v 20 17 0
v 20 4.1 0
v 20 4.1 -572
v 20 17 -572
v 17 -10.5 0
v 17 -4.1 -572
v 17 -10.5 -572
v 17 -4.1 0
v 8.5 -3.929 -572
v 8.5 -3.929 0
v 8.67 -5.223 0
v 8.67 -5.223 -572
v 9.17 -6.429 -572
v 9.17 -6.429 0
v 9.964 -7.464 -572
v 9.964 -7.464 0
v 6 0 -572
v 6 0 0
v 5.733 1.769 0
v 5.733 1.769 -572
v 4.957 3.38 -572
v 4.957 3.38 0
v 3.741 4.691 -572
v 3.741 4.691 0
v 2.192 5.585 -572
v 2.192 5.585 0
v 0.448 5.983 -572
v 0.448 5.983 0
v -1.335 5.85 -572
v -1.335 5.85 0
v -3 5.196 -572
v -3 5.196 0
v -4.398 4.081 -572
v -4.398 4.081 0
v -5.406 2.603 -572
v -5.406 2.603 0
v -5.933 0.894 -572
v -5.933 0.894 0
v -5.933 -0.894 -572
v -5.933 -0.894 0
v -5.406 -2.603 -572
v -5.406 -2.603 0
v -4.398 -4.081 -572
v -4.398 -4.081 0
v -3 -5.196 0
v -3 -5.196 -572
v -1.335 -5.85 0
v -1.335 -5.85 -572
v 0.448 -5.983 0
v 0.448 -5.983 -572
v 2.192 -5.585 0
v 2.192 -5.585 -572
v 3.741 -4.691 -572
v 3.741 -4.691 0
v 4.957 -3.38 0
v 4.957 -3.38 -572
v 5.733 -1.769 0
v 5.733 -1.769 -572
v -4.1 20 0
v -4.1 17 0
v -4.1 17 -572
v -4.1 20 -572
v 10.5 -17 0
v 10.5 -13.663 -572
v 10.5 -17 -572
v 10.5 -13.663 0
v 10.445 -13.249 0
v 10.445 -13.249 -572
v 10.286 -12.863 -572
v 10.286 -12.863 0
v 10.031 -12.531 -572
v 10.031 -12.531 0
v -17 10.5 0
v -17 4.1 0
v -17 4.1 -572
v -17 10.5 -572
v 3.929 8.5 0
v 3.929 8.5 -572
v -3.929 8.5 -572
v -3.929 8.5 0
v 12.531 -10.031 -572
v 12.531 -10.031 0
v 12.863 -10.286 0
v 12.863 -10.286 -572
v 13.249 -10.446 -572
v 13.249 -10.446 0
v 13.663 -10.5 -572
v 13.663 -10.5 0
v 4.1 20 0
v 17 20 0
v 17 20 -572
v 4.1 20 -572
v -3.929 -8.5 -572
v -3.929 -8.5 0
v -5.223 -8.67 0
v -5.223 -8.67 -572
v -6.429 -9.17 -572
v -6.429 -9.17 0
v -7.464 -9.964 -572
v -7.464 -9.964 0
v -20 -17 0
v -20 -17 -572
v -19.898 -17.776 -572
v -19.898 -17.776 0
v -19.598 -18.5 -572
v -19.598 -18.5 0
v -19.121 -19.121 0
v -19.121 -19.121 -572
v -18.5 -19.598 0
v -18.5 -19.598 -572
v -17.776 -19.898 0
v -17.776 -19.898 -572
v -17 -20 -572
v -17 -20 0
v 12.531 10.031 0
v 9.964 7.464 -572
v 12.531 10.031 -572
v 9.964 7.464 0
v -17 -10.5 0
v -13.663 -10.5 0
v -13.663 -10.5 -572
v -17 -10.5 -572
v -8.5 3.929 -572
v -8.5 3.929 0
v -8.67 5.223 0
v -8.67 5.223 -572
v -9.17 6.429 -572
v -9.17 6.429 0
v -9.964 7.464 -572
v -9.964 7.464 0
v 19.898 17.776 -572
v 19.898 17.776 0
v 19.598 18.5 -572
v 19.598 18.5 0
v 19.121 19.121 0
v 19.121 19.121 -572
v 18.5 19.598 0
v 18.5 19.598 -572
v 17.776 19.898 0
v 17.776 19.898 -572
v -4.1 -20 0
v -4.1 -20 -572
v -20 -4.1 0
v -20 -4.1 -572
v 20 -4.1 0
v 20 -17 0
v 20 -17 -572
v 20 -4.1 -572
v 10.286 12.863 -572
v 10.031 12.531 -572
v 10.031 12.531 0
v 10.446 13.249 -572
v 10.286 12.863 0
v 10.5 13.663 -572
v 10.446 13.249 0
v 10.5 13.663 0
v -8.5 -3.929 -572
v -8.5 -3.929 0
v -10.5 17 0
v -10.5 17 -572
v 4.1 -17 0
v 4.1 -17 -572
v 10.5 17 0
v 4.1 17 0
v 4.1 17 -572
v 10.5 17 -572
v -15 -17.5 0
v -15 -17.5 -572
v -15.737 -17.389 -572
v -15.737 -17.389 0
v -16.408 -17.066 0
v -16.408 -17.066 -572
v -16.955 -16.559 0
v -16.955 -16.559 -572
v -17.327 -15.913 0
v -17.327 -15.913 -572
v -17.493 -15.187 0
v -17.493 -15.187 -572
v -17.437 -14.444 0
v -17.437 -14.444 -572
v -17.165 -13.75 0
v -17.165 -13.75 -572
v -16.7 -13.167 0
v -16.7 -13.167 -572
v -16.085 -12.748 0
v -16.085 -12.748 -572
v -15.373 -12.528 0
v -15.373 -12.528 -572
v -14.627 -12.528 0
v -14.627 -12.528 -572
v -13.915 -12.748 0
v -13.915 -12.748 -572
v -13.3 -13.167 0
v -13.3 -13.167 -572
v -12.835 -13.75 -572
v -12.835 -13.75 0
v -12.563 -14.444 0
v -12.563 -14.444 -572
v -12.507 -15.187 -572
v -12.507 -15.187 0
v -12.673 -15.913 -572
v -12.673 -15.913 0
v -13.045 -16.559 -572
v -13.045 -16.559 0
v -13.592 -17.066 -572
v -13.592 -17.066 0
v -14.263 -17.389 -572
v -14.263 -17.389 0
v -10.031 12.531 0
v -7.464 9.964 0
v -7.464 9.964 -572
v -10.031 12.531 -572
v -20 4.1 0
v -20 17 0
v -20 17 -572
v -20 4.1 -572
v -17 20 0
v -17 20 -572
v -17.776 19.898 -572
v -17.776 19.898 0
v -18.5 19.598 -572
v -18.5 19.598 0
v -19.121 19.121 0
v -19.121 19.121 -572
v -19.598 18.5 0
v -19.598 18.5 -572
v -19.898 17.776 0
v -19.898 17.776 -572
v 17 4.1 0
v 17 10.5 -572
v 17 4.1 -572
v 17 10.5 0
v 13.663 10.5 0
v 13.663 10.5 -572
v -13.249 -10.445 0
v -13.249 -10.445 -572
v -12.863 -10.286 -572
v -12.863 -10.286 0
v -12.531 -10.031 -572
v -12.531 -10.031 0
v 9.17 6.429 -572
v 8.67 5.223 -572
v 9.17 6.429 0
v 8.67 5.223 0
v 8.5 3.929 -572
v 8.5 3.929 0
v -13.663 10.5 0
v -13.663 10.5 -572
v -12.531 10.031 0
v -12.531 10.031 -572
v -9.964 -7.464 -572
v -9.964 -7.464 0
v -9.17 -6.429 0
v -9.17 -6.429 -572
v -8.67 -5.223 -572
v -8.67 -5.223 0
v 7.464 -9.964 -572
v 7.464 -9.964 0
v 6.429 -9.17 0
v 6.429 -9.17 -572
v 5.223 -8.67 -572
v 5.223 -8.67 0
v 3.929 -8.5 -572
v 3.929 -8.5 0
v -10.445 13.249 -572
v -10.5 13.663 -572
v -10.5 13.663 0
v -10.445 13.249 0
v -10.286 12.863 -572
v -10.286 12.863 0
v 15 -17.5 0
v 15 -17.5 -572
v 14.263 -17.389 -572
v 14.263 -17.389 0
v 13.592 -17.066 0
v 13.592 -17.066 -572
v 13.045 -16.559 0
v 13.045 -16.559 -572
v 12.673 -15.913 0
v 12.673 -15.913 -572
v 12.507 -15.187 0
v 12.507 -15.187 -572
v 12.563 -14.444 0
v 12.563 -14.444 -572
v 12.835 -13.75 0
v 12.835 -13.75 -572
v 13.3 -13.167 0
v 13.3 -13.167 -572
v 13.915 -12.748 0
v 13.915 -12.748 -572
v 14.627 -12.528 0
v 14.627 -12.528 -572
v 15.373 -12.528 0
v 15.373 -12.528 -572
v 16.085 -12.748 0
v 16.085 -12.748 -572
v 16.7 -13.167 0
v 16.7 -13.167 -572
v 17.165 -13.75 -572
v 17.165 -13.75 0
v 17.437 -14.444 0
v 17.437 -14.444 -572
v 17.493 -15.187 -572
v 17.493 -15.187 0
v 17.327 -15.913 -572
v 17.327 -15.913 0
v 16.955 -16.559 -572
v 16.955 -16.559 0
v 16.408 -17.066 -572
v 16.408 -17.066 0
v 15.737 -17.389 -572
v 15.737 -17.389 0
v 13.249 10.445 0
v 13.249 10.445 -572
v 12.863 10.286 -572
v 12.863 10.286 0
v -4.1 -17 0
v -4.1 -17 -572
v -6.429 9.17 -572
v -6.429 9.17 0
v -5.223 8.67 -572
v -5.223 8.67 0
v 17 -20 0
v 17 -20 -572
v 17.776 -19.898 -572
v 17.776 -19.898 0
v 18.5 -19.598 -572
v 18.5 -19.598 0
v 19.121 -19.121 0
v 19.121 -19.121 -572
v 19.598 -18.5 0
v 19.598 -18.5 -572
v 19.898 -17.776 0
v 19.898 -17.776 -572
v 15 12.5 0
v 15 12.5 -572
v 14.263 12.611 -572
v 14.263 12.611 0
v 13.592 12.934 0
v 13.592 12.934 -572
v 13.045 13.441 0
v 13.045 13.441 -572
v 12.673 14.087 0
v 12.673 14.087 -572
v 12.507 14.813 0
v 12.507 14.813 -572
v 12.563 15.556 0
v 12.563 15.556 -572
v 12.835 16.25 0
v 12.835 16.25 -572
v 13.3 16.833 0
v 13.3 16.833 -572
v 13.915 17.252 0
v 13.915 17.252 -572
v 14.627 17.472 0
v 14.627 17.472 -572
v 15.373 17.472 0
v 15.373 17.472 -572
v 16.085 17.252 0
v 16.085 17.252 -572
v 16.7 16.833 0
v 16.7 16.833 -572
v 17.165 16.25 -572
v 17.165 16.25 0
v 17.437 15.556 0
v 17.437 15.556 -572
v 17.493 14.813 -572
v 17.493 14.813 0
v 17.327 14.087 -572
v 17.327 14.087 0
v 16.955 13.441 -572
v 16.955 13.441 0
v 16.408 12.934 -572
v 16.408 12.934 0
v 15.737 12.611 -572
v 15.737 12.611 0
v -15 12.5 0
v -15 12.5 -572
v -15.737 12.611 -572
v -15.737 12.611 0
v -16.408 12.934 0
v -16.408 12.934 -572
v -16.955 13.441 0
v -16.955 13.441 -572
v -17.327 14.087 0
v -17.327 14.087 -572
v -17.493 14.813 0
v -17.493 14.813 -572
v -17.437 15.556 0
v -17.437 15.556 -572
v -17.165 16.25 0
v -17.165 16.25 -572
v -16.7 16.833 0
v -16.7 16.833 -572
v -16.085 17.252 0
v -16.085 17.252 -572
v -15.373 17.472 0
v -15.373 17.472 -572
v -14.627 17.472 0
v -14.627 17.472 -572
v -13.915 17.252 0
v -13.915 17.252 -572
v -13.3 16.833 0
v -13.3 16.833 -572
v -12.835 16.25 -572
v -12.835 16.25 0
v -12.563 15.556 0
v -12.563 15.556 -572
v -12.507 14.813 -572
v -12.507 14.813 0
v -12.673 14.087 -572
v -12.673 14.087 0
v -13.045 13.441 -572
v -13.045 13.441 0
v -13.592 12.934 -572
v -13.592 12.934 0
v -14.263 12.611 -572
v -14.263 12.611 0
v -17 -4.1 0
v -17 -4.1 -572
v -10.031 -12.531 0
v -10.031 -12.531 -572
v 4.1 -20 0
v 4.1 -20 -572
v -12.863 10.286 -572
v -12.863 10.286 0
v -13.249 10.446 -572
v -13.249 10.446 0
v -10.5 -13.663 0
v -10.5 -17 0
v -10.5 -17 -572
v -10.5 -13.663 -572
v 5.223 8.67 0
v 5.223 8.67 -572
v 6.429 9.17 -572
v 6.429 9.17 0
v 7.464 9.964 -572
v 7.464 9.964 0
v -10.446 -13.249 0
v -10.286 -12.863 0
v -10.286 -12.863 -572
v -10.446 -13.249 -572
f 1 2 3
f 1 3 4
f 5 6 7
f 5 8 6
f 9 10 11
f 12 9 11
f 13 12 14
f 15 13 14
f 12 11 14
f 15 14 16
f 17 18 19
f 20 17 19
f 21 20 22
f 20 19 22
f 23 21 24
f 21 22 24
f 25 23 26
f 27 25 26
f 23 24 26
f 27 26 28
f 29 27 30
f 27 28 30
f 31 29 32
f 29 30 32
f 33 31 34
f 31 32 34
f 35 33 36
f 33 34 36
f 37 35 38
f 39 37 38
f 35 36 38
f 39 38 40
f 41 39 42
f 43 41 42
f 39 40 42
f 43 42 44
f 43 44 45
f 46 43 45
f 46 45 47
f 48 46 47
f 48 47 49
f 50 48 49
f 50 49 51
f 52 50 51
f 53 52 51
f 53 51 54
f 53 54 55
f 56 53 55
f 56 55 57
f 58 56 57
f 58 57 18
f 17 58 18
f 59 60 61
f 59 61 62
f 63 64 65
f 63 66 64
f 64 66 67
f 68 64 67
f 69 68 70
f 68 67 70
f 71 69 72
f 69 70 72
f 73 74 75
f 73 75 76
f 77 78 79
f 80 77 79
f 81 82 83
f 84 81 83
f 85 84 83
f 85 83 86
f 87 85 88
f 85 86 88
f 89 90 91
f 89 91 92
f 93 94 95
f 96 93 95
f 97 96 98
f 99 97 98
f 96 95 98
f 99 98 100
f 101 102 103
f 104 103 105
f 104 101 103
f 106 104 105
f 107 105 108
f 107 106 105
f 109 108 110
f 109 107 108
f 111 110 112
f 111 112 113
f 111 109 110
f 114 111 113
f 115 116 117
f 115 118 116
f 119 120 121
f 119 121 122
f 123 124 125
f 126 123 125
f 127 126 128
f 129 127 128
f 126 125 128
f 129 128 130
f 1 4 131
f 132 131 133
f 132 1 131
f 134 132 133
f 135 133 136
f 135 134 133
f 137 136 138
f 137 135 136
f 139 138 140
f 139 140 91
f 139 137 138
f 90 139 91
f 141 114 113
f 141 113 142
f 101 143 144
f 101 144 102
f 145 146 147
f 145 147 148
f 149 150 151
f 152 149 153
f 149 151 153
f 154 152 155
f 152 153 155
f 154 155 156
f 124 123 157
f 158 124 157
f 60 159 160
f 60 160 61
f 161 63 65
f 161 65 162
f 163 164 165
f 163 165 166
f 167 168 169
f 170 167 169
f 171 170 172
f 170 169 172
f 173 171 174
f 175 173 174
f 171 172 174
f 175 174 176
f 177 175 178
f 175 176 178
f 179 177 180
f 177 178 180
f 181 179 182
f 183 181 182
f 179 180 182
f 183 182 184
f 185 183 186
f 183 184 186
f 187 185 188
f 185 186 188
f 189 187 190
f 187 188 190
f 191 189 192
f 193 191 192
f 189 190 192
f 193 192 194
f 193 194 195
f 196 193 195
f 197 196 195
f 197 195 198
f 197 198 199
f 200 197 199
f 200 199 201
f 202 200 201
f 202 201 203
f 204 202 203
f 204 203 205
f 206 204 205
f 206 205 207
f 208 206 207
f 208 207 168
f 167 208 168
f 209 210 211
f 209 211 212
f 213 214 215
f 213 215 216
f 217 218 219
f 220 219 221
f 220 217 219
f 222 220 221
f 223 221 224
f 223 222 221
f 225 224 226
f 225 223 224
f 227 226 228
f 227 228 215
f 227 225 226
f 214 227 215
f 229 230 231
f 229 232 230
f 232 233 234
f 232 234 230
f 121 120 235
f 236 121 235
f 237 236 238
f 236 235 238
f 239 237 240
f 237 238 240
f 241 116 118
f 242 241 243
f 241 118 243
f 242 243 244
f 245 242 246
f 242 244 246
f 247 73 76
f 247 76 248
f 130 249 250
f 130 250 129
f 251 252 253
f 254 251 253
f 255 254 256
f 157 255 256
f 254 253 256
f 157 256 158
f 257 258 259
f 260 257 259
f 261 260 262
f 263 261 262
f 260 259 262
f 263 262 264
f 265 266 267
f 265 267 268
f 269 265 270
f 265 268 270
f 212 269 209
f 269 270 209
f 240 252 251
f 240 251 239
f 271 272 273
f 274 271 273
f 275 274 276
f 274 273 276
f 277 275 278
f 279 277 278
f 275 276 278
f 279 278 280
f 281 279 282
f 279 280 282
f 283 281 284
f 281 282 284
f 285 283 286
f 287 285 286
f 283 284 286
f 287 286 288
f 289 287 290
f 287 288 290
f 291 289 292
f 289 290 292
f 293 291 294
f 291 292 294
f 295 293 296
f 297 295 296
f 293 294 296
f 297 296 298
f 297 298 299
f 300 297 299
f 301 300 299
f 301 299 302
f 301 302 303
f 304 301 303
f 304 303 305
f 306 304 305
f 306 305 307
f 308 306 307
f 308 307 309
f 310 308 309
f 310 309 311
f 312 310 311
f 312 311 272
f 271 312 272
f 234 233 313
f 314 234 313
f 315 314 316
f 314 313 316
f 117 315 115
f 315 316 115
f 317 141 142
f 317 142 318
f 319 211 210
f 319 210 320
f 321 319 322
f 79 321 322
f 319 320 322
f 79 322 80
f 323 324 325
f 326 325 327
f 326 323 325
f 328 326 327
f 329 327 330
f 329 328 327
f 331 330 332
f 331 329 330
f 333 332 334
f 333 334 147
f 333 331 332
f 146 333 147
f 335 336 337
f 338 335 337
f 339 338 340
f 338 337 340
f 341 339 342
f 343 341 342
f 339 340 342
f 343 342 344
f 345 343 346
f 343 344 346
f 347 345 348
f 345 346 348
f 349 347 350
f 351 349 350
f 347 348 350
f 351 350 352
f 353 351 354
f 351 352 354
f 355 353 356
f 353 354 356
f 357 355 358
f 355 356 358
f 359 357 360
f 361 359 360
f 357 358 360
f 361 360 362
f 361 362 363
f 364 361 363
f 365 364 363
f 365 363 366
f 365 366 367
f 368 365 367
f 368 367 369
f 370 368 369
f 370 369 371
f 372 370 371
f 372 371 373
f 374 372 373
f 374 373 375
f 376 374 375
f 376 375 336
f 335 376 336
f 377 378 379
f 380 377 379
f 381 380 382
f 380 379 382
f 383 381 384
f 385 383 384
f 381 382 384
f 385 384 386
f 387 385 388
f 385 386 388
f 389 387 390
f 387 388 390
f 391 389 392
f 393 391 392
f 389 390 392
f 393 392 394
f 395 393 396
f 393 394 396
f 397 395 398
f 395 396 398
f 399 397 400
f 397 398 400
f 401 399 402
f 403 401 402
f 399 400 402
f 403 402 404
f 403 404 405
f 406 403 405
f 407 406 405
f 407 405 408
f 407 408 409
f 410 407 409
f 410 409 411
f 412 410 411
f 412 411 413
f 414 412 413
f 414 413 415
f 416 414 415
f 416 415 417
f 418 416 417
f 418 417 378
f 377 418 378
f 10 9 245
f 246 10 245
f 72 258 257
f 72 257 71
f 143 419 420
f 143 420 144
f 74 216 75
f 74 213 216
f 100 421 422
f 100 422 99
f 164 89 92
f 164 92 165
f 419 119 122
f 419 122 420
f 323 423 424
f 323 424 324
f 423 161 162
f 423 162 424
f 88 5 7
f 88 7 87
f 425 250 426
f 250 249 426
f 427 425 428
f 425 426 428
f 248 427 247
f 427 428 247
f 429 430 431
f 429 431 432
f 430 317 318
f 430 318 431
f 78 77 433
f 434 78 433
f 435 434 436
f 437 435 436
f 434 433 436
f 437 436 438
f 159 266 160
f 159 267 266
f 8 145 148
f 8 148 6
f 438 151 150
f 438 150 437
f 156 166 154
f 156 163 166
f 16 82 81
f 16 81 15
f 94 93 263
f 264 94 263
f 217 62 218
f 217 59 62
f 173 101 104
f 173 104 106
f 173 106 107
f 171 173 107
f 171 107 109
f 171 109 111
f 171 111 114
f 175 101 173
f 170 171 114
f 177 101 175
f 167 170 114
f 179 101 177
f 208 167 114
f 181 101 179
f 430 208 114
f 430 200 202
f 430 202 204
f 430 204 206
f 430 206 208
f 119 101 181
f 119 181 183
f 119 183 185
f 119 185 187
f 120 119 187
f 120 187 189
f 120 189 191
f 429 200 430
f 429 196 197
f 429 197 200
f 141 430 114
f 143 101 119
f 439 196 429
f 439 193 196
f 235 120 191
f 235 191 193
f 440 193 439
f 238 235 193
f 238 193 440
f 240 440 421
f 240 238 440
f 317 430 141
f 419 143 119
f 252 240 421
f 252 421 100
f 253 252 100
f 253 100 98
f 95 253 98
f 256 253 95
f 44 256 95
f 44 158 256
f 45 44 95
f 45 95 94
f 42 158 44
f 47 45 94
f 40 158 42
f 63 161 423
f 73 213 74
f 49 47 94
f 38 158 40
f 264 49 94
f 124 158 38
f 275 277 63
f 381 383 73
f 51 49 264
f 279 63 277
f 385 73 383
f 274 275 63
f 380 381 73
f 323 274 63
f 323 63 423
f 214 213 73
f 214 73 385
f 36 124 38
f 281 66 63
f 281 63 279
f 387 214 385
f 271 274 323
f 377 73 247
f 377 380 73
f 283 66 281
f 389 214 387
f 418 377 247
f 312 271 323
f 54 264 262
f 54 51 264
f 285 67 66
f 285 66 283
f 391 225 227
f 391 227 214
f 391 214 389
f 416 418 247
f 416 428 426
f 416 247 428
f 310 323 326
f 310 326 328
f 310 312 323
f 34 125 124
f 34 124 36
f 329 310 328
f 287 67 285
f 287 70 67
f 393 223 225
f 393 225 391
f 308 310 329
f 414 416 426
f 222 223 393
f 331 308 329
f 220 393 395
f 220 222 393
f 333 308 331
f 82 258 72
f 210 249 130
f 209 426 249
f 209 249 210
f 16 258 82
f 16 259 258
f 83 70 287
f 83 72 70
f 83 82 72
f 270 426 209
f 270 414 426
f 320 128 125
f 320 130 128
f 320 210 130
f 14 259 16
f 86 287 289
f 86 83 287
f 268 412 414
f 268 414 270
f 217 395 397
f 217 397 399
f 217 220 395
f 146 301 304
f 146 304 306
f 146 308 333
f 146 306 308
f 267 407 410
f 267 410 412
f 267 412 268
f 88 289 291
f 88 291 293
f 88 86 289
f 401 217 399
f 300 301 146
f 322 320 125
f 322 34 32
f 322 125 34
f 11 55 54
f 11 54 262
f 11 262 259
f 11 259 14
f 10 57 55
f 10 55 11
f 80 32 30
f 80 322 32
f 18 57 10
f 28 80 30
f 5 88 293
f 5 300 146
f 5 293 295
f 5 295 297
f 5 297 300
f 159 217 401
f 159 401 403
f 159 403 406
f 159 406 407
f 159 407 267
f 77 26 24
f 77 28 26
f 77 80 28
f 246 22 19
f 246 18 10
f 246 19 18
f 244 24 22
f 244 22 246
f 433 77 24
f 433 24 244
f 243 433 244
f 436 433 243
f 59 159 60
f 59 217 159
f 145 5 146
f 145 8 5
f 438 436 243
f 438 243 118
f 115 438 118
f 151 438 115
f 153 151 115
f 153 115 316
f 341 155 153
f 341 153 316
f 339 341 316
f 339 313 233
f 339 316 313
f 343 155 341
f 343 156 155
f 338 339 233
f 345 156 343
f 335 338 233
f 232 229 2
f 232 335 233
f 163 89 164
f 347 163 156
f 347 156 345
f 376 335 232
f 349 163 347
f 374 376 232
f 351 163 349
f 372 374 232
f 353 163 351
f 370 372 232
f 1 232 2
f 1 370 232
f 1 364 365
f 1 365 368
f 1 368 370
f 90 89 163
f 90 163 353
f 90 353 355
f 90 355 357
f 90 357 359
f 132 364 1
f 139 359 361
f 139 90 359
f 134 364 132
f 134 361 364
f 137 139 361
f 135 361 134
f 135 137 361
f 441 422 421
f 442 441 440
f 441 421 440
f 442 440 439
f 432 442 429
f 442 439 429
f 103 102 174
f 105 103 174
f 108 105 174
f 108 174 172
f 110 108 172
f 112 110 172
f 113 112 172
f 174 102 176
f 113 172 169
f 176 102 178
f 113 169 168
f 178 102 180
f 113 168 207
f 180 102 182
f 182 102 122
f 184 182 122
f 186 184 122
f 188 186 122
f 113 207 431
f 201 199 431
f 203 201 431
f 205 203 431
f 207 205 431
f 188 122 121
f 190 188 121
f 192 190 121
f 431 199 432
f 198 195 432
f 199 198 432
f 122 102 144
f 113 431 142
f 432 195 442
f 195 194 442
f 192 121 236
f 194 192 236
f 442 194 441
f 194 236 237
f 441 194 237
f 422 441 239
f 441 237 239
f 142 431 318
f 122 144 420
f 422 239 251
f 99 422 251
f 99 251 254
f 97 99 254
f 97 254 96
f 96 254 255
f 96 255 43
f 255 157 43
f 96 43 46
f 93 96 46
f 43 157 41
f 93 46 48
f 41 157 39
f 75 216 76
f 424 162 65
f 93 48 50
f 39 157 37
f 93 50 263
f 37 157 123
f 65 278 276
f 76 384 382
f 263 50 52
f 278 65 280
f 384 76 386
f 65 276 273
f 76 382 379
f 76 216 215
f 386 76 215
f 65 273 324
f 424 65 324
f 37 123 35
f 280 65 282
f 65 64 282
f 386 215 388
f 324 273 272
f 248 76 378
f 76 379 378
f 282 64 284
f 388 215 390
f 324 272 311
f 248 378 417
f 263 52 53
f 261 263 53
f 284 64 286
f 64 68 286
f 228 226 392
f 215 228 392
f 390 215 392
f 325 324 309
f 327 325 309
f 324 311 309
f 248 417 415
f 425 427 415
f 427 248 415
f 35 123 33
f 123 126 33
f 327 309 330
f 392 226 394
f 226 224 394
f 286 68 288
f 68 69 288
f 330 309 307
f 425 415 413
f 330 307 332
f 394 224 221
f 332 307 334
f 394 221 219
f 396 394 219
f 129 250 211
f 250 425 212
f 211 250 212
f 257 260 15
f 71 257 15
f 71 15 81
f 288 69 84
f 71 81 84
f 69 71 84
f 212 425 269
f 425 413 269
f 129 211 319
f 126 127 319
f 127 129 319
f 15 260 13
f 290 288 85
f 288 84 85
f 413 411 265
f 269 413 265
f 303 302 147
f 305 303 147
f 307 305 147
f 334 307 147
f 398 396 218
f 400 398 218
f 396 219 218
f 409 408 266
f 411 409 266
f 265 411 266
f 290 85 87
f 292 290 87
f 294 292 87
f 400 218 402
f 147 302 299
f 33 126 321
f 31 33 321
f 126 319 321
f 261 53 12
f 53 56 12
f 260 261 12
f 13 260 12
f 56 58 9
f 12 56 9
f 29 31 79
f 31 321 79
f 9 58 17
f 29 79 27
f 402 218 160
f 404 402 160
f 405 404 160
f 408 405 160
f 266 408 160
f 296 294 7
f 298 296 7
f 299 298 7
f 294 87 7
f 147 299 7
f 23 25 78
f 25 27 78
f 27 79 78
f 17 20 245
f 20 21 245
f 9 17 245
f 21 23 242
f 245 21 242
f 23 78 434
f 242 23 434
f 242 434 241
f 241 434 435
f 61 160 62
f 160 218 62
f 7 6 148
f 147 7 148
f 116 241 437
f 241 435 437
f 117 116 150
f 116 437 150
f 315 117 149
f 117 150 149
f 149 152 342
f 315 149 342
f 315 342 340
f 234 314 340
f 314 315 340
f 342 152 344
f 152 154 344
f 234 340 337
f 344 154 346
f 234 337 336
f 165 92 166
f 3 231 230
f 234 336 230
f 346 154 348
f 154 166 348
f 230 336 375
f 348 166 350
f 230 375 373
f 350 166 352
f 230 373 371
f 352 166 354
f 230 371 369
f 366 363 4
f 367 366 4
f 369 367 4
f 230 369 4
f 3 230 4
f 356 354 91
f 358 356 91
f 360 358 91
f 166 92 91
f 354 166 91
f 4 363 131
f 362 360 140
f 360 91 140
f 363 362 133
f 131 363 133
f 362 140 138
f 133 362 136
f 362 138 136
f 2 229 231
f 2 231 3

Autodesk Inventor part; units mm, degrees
sketch "Skizze_1" plane through (0, 0, 0) normal (0, 0, 1) x (1, 0, 0)
  arc A0 (-20, -17) -> (-17, -20) centre (-17, -17) ccw
  line L0 (-17, -20) -> (-4.1, -20)
  line L1 (-4.1, -20) -> (-4.1, -17)
  line L2 (-4.1, -17) -> (-10.5, -17)
  line L3 (-10.5, -17) -> (-10.5, -13.6627)
  arc A1 (-10.0314, -12.5314) -> (-10.5, -13.6627) centre (-8.9002, -13.6627) ccw
  line L4 (-10.0314, -12.5314) -> (-7.4645, -9.9645)
  arc A2 (-3.9289, -8.5) -> (-7.4645, -9.9645) centre (-3.9289, -13.5) ccw
  line L5 (-3.9289, -8.5) -> (3.9289, -8.5)
  arc A3 (7.4645, -9.9645) -> (3.9289, -8.5) centre (3.9289, -13.5) ccw
  line L6 (7.4645, -9.9645) -> (10.0314, -12.5314)
  arc A4 (10.5, -13.6627) -> (10.0314, -12.5314) centre (8.9002, -13.6627) ccw
  line L7 (10.5, -13.6627) -> (10.5, -17)
  line L8 (10.5, -17) -> (4.1, -17)
  line L9 (4.1, -17) -> (4.1, -20)
  line L10 (4.1, -20) -> (17, -20)
  arc A5 (17, -20) -> (20, -17) centre (17, -17) ccw
  line L11 (20, -17) -> (20, -4.1)
  line L12 (20, -4.1) -> (17, -4.1)
  line L13 (17, -4.1) -> (17, -10.5)
  line L14 (17, -10.5) -> (13.6627, -10.5)
  arc A6 (12.5314, -10.0314) -> (13.6627, -10.5) centre (13.6627, -8.9002) ccw
  line L15 (12.5314, -10.0314) -> (9.9645, -7.4645)
  arc A7 (8.5, -3.9289) -> (9.9645, -7.4645) centre (13.5, -3.9289) ccw
  line L16 (8.5, -3.9289) -> (8.5, 3.9289)
  arc A8 (9.9645, 7.4645) -> (8.5, 3.9289) centre (13.5, 3.9289) ccw
  line L17 (9.9645, 7.4645) -> (12.5314, 10.0314)
  arc A9 (13.6627, 10.5) -> (12.5314, 10.0314) centre (13.6627, 8.9002) ccw
  line L18 (13.6627, 10.5) -> (17, 10.5)
  line L19 (17, 10.5) -> (17, 4.1)
  line L20 (17, 4.1) -> (20, 4.1)
  line L21 (20, 4.1) -> (20, 17)
  arc A10 (20, 17) -> (17, 20) centre (17, 17) ccw
  line L22 (17, 20) -> (4.1, 20)
  line L23 (4.1, 20) -> (4.1, 17)
  line L24 (4.1, 17) -> (10.5, 17)
  line L25 (10.5, 17) -> (10.5, 13.6627)
  arc A11 (10.0314, 12.5314) -> (10.5, 13.6627) centre (8.9002, 13.6627) ccw
  line L26 (10.0314, 12.5314) -> (7.4645, 9.9645)
  arc A12 (3.9289, 8.5) -> (7.4645, 9.9645) centre (3.9289, 13.5) ccw
  line L27 (3.9289, 8.5) -> (-3.9289, 8.5)
  arc A13 (-7.4645, 9.9645) -> (-3.9289, 8.5) centre (-3.9289, 13.5) ccw
  line L28 (-7.4645, 9.9645) -> (-10.0314, 12.5314)
  arc A14 (-10.5, 13.6627) -> (-10.0314, 12.5314) centre (-8.9002, 13.6627) ccw
  line L29 (-10.5, 13.6627) -> (-10.5, 17)
  line L30 (-10.5, 17) -> (-4.1, 17)
  line L31 (-4.1, 17) -> (-4.1, 20)
  line L32 (-4.1, 20) -> (-17, 20)
  arc A15 (-17, 20) -> (-20, 17) centre (-17, 17) ccw
  line L33 (-20, 17) -> (-20, 4.1)
  line L34 (-20, 4.1) -> (-17, 4.1)
  line L35 (-17, 4.1) -> (-17, 10.5)
  line L36 (-17, 10.5) -> (-13.6627, 10.5)
  arc A16 (-12.5314, 10.0314) -> (-13.6627, 10.5) centre (-13.6627, 8.9002) ccw
  line L37 (-12.5314, 10.0314) -> (-9.9645, 7.4645)
  arc A17 (-8.5, 3.9289) -> (-9.9645, 7.4645) centre (-13.5, 3.9289) ccw
  line L38 (-8.5, 3.9289) -> (-8.5, -3.9289)
  arc A18 (-9.9645, -7.4645) -> (-8.5, -3.9289) centre (-13.5, -3.9289) ccw
  line L39 (-9.9645, -7.4645) -> (-12.5314, -10.0314)
  arc A19 (-13.6627, -10.5) -> (-12.5314, -10.0314) centre (-13.6627, -8.9002) ccw
  line L40 (-13.6627, -10.5) -> (-17, -10.5)
  line L41 (-17, -10.5) -> (-17, -4.1)
  line L42 (-17, -4.1) -> (-20, -4.1)
  line L43 (-20, -4.1) -> (-20, -17)
  circle A20 centre (0, 0) radius 6
extrude "Extrusion1" add sketch "Skizze_1" against normal blind 572
sketch "Sketch2" plane through (0, 0, 0) normal (0, 0, 1) x (1, 0, 0)
  point P0 (-15, -15)
hole "Drilling 1" at (-15, -15, 0) direction (0, 0, -1) diameter 5 depth 6000
sketch "Sketch3" plane through (0, 0, 0) normal (0, 0, 1) x (1, 0, 0)
  point P0 (15, -15)
hole "Drilling 2" at (15, -15, 0) direction (0, 0, -1) diameter 5 depth 6000
sketch "Sketch4" plane through (0, 0, 0) normal (0, 0, 1) x (1, 0, 0)
  point P0 (15, 15)
hole "Drilling 3" at (15, 15, 0) direction (0, 0, -1) diameter 5 depth 6000
sketch "Sketch5" plane through (0, 0, 0) normal (0, 0, 1) x (1, 0, 0)
  point P0 (-15, 15)
hole "Drilling 4" at (-15, 15, 0) direction (0, 0, -1) diameter 5 depth 6000
ref_plane "side_4d_XY" through (-20, 0, -286) normal (-1, 0, 0) x (0, 1, 0)
ref_plane "side_4d_YZ" through (-20, 0, -286) normal (0, 1, 0) x (0, 0, -1)
ref_plane "side_4d_ZX" through (-20, 0, -286) normal (0, 0, -1) x (-1, 0, 0)
ref_plane "side_1a_XY" through (0, 20, -286) normal (0, 1, 0) x (1, 0, 0)
ref_plane "side_1a_YZ" through (0, 20, -286) normal (1, 0, 0) x (0, 0, -1)
ref_plane "side_1a_ZX" through (0, 20, -286) normal (0, 0, -1) x (0, 1, 0)
ref_plane "side_2b_XY" through (20, 0, -286) normal (1, 0, 0) x (0, -1, 0)
ref_plane "side_2b_YZ" through (20, 0, -286) normal (0, -1, 0) x (0, 0, -1)
ref_plane "side_2b_ZX" through (20, 0, -286) normal (0, 0, -1) x (1, 0, 0)
ref_plane "side_3c_XY" through (0, -20, -286) normal (0, -1, 0) x (-1, 0, 0)
ref_plane "side_3c_YZ" through (0, -20, -286) normal (-1, 0, 0) x (0, 0, -1)
ref_plane "side_3c_ZX" through (0, -20, -286) normal (0, 0, -1) x (0, -1, 0)
ref_plane "end_XY" through (0, 0, -572) normal (0, 0, -1) x (1, 0, 0)
ref_plane "end_YZ" through (0, 0, -572) normal (1, 0, 0) x (0, -1, 0)
ref_plane "end_ZX" through (0, 0, -572) normal (0, -1, 0) x (0, 0, -1)
ref_plane "start_XY" through (0, 0, 0) normal (0, 0, 1) x (1, 0, 0)
ref_plane "start_YZ" through (0, 0, 0) normal (1, 0, 0) x (0, 1, 0)
ref_plane "start_ZX" through (0, 0, 0) normal (0, 1, 0) x (0, 0, 1)
properties part number "MayTec 1.11.040040.43S_Profile 40x40, 4E, S_572_Detail_(0;0,0,0)"
